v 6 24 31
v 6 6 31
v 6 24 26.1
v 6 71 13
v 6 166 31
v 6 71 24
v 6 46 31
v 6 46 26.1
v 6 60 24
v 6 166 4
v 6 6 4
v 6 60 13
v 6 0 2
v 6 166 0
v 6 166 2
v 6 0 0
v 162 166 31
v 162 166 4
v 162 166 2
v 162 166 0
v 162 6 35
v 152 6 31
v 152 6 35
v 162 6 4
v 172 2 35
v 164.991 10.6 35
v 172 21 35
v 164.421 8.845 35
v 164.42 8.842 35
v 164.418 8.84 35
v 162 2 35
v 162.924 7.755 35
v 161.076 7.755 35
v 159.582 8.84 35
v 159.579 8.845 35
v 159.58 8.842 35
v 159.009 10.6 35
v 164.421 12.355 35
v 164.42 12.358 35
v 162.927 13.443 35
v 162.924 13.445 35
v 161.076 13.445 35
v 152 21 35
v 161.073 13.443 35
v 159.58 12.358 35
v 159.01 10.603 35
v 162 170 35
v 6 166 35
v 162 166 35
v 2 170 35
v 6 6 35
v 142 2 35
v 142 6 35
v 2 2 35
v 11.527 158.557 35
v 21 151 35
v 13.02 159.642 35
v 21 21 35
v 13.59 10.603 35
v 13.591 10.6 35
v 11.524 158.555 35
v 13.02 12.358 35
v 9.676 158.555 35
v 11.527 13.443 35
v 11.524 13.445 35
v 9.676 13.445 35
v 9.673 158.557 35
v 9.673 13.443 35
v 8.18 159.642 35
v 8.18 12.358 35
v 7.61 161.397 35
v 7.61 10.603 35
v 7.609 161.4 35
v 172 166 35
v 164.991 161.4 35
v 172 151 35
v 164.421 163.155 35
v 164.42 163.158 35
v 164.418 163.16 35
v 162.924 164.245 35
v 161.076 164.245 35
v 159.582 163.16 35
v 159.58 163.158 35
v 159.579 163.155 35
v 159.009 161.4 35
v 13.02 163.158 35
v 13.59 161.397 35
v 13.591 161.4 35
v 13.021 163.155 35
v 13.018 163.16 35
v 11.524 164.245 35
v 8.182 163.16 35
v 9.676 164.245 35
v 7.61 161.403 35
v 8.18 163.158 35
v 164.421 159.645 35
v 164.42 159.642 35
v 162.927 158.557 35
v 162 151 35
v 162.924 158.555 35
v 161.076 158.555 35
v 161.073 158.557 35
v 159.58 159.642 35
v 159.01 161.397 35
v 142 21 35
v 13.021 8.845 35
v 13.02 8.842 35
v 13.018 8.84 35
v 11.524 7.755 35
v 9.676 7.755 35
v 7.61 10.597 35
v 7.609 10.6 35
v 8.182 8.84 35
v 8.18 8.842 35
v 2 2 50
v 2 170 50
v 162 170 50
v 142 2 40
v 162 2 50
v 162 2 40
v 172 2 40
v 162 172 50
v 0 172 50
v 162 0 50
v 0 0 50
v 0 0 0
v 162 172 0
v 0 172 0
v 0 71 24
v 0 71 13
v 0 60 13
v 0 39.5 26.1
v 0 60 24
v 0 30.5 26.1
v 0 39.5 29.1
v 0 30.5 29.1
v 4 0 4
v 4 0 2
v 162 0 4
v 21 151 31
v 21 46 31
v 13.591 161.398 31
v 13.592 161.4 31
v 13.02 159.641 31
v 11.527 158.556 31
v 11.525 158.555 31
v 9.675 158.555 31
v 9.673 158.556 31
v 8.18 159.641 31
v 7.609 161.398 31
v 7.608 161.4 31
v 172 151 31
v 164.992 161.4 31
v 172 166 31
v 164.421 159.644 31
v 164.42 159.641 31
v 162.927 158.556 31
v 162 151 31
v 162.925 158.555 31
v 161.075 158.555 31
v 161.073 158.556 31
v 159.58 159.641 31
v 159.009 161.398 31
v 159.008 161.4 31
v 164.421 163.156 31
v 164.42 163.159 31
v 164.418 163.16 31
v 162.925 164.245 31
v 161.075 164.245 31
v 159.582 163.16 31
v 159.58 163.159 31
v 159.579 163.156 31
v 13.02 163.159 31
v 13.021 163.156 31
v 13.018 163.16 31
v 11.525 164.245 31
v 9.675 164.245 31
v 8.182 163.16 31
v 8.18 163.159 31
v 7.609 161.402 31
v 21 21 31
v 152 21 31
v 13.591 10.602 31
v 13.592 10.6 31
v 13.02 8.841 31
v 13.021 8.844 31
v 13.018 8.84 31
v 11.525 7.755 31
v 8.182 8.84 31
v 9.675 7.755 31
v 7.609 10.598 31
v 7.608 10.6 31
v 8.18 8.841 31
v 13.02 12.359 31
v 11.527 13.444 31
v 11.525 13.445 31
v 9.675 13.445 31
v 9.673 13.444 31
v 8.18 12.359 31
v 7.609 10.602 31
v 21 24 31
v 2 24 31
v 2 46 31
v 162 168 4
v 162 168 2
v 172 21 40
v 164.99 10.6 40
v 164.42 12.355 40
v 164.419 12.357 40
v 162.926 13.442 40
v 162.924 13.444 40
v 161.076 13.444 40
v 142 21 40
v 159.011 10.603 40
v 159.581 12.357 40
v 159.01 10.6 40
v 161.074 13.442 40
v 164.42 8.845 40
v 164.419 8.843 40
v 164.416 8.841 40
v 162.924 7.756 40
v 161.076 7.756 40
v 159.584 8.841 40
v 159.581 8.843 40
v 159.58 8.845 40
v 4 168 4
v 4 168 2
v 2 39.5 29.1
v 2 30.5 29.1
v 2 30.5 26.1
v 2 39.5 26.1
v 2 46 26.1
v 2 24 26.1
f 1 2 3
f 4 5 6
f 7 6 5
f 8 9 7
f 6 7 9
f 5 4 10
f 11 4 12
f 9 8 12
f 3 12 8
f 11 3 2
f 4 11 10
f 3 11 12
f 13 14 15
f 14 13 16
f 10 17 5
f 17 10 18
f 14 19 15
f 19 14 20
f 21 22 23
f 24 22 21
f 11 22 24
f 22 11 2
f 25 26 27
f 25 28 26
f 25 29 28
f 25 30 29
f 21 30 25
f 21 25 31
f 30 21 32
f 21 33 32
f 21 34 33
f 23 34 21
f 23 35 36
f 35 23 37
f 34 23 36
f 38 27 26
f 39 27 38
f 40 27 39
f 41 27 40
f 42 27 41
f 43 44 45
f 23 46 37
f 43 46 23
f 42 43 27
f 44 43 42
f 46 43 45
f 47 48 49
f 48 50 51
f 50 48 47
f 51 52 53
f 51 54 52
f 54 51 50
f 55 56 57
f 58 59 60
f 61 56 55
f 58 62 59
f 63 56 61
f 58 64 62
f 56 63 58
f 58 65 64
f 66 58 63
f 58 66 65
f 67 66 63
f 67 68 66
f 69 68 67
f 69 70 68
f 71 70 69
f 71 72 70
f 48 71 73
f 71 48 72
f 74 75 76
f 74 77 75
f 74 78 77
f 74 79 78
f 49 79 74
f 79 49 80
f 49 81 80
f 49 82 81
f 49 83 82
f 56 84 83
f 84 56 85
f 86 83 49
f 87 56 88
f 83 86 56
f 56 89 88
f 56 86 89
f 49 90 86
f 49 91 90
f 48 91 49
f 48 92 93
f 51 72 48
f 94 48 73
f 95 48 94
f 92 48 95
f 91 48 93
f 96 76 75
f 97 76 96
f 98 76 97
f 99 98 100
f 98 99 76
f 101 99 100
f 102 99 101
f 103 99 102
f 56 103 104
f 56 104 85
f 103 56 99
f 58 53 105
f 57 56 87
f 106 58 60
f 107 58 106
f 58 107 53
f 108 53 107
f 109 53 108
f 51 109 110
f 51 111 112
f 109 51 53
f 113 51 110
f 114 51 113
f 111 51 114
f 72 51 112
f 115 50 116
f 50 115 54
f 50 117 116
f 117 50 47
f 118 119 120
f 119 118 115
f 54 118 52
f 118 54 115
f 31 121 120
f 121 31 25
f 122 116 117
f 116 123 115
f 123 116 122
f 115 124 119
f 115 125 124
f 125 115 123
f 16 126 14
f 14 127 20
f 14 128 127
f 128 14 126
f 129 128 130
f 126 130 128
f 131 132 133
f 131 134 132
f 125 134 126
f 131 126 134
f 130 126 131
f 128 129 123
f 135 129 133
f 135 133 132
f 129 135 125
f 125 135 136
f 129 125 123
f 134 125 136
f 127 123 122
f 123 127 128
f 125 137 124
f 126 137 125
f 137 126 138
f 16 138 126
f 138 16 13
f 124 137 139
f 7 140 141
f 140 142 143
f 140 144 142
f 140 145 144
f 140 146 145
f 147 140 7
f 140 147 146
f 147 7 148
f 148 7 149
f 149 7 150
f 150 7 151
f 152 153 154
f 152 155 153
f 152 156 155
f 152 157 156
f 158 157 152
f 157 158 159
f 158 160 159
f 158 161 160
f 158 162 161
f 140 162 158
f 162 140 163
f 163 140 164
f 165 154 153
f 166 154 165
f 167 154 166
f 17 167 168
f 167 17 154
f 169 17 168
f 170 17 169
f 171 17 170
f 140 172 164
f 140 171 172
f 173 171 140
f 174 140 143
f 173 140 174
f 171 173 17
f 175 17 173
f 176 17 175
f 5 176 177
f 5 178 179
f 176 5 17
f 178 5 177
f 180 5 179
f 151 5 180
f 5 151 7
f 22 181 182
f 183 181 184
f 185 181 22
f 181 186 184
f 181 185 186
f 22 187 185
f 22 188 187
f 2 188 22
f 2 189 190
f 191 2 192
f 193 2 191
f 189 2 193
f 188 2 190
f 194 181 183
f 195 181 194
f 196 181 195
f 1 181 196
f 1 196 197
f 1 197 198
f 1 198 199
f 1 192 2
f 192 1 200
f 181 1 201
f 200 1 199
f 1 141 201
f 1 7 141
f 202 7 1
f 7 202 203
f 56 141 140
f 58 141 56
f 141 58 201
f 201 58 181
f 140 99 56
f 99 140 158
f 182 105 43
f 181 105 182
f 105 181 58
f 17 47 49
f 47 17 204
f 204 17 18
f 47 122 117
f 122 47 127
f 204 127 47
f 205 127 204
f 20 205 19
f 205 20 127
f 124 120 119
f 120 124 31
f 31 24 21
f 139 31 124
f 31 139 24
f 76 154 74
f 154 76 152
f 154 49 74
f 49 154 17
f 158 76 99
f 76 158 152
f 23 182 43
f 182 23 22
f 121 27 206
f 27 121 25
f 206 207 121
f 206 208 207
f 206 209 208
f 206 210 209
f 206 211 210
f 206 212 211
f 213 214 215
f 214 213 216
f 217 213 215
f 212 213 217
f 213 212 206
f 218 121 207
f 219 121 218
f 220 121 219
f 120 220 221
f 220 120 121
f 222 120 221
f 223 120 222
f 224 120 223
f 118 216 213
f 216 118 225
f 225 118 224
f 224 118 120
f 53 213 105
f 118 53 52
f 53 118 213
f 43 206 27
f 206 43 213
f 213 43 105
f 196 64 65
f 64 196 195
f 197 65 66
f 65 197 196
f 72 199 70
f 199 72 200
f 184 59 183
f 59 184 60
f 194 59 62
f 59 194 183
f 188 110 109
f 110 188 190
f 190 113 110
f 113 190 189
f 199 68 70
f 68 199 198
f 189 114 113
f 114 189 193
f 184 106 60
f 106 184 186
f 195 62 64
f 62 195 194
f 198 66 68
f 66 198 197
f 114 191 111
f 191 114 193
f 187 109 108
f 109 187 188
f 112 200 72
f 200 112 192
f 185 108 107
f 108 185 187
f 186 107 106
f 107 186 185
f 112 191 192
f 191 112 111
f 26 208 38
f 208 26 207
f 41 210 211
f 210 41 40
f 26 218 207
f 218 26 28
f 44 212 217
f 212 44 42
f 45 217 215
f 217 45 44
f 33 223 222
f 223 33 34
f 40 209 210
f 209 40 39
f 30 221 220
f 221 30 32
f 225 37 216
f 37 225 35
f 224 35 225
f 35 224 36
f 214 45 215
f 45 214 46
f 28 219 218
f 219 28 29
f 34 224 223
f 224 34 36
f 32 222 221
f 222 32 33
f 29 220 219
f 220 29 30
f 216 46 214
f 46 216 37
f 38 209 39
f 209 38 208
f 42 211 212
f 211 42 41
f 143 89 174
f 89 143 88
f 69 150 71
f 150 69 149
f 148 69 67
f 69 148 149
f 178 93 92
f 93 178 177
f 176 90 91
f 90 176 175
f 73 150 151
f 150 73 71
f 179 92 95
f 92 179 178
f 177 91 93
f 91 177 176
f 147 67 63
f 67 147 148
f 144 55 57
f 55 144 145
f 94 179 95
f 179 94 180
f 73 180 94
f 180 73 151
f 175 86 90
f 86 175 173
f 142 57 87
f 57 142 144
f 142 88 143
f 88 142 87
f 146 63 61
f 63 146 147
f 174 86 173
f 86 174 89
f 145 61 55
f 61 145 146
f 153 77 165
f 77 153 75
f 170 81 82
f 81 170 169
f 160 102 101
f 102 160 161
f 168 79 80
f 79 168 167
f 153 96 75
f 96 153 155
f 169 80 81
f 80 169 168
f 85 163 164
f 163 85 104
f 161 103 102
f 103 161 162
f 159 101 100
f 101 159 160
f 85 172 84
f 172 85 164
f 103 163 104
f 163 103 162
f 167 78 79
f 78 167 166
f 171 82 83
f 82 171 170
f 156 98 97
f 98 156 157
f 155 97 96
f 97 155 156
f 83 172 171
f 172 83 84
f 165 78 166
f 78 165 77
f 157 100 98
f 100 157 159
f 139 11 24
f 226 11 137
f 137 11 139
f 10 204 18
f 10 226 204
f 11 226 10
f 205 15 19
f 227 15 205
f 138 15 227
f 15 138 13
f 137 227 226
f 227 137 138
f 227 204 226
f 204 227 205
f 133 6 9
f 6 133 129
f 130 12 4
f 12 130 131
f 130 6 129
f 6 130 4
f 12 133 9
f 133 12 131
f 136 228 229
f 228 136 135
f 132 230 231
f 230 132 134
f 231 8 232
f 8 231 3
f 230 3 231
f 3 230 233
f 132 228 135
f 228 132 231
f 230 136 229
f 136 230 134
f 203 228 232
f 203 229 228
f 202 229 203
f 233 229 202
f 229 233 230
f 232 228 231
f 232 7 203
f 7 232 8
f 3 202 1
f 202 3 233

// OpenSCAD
box_depth = 50;
led_depth = 15;
led_height = 160;
led_width = 320;
thinn_wall = 2;
wall = 6;

krans_depth = 4;
krans_width = 15;

middle_overlap = 10;
overlap_margin = 10;

left_side = false;

bolt_indent = 8.6;

backwall_depth = 2;
backwall_thickness = 2;
backwall_margin = 2;

difference() {
    union() {
        difference() {
            union() {
                intersection() {
                    union() {
                        difference() { // walls
                            cube([led_width + 2 * wall, led_height + 2 * wall, box_depth]);
                            union() {
                                translate([wall, wall, -0.5]) {
                                    cube([led_width, led_height, box_depth + 1]);
                                }
                                translate([thinn_wall, thinn_wall, box_depth - led_depth]) {
                                    cube([led_width + 2 * (wall - thinn_wall), led_height + 2 * (wall - thinn_wall), led_depth + 1]);
                                }
                            }
                        }

                        difference() { // krans
                            translate([wall, wall, box_depth - led_depth - krans_depth]) {
                                cube([led_width, led_height, krans_depth]);
                            }
                            translate([wall + krans_width, wall + krans_width, box_depth - led_depth - krans_depth - 0.5]) {
                                cube([led_width - 2 * krans_width, led_height - 2 * krans_width, krans_depth + 1]);
                            }
                        }
                    }
                    cube([led_width / 2 + thinn_wall, 10000, 10000]); // cut away half
                }

                translate([led_width / 2 + thinn_wall, led_height + wall - krans_width, box_depth - led_depth - krans_depth]) {
                    cube([middle_overlap, krans_width, krans_depth]); // utstick overlap
                }
            }
            translate([led_width / 2 + thinn_wall - middle_overlap, wall, box_depth - led_depth - krans_depth - 0.5]) {
                cube([middle_overlap + 1, krans_width + 1, krans_depth + 1]); // to bort overlap
            }
        }
        translate([led_width / 2 + thinn_wall - middle_overlap - overlap_margin, thinn_wall, box_depth - led_depth]) {
            cube([middle_overlap * 2 + overlap_margin, krans_width + wall - thinn_wall, krans_depth + 1]); // overlap överliggande
        }
    }
    union() { // bolt holes
        translate([thinn_wall + bolt_indent, thinn_wall + bolt_indent, -10]) {
            cylinder(10000, 3, true);
        }
        translate([led_width / 2 + thinn_wall, thinn_wall + bolt_indent, -10]) {
            cylinder(10000, 3, true);
        }
        translate([thinn_wall + bolt_indent, led_height + 2 * wall - thinn_wall - bolt_indent, -10]) {
            cylinder(10000, 3, true);
        }
        translate([led_width / 2 + thinn_wall, led_height + 2 * wall - thinn_wall - bolt_indent, -10]) {
            cylinder(10000, 3, true);
        }
    }
    union() { // backwall
        translate([wall - backwall_depth, wall - backwall_depth, backwall_margin]) {
            cube([led_width + 2 * backwall_depth, led_height + 2 * backwall_depth, backwall_thickness]);
        }
        if (left_side) {
            translate([wall, led_height + wall - 0.5,-1]) {
                cube([10000, wall + 1, backwall_thickness + backwall_margin + 1]);
                translate([-backwall_depth, 0, backwall_margin + 1]) {
                    cube([10000, wall + 1, backwall_thickness]);
                }
            }
        } else {
            translate([wall, -0.5,-1]) {
                cube([10000, wall + 1, backwall_thickness + backwall_margin + 1]);
                translate([-backwall_depth, 0, backwall_margin + 1]) {
                    cube([10000, wall + 1, backwall_thickness]);
                }
            }
        }
    }
    if (!left_side) {
        union() {
            translate([0, 60, 13]) {
                cube([100, 11, 11]);
            }
            translate([0, 35 - 9 / 2, box_depth-krans_width - krans_depth - 3 - 1.9]) {
                cube([100, 9, 3]);
            }
            translate([2, 35 - 22 / 2, box_depth-krans_width - krans_depth - 3 - 1.9]) {
                cube([100, 22, 4.9]);
            }
        }
    }
}
